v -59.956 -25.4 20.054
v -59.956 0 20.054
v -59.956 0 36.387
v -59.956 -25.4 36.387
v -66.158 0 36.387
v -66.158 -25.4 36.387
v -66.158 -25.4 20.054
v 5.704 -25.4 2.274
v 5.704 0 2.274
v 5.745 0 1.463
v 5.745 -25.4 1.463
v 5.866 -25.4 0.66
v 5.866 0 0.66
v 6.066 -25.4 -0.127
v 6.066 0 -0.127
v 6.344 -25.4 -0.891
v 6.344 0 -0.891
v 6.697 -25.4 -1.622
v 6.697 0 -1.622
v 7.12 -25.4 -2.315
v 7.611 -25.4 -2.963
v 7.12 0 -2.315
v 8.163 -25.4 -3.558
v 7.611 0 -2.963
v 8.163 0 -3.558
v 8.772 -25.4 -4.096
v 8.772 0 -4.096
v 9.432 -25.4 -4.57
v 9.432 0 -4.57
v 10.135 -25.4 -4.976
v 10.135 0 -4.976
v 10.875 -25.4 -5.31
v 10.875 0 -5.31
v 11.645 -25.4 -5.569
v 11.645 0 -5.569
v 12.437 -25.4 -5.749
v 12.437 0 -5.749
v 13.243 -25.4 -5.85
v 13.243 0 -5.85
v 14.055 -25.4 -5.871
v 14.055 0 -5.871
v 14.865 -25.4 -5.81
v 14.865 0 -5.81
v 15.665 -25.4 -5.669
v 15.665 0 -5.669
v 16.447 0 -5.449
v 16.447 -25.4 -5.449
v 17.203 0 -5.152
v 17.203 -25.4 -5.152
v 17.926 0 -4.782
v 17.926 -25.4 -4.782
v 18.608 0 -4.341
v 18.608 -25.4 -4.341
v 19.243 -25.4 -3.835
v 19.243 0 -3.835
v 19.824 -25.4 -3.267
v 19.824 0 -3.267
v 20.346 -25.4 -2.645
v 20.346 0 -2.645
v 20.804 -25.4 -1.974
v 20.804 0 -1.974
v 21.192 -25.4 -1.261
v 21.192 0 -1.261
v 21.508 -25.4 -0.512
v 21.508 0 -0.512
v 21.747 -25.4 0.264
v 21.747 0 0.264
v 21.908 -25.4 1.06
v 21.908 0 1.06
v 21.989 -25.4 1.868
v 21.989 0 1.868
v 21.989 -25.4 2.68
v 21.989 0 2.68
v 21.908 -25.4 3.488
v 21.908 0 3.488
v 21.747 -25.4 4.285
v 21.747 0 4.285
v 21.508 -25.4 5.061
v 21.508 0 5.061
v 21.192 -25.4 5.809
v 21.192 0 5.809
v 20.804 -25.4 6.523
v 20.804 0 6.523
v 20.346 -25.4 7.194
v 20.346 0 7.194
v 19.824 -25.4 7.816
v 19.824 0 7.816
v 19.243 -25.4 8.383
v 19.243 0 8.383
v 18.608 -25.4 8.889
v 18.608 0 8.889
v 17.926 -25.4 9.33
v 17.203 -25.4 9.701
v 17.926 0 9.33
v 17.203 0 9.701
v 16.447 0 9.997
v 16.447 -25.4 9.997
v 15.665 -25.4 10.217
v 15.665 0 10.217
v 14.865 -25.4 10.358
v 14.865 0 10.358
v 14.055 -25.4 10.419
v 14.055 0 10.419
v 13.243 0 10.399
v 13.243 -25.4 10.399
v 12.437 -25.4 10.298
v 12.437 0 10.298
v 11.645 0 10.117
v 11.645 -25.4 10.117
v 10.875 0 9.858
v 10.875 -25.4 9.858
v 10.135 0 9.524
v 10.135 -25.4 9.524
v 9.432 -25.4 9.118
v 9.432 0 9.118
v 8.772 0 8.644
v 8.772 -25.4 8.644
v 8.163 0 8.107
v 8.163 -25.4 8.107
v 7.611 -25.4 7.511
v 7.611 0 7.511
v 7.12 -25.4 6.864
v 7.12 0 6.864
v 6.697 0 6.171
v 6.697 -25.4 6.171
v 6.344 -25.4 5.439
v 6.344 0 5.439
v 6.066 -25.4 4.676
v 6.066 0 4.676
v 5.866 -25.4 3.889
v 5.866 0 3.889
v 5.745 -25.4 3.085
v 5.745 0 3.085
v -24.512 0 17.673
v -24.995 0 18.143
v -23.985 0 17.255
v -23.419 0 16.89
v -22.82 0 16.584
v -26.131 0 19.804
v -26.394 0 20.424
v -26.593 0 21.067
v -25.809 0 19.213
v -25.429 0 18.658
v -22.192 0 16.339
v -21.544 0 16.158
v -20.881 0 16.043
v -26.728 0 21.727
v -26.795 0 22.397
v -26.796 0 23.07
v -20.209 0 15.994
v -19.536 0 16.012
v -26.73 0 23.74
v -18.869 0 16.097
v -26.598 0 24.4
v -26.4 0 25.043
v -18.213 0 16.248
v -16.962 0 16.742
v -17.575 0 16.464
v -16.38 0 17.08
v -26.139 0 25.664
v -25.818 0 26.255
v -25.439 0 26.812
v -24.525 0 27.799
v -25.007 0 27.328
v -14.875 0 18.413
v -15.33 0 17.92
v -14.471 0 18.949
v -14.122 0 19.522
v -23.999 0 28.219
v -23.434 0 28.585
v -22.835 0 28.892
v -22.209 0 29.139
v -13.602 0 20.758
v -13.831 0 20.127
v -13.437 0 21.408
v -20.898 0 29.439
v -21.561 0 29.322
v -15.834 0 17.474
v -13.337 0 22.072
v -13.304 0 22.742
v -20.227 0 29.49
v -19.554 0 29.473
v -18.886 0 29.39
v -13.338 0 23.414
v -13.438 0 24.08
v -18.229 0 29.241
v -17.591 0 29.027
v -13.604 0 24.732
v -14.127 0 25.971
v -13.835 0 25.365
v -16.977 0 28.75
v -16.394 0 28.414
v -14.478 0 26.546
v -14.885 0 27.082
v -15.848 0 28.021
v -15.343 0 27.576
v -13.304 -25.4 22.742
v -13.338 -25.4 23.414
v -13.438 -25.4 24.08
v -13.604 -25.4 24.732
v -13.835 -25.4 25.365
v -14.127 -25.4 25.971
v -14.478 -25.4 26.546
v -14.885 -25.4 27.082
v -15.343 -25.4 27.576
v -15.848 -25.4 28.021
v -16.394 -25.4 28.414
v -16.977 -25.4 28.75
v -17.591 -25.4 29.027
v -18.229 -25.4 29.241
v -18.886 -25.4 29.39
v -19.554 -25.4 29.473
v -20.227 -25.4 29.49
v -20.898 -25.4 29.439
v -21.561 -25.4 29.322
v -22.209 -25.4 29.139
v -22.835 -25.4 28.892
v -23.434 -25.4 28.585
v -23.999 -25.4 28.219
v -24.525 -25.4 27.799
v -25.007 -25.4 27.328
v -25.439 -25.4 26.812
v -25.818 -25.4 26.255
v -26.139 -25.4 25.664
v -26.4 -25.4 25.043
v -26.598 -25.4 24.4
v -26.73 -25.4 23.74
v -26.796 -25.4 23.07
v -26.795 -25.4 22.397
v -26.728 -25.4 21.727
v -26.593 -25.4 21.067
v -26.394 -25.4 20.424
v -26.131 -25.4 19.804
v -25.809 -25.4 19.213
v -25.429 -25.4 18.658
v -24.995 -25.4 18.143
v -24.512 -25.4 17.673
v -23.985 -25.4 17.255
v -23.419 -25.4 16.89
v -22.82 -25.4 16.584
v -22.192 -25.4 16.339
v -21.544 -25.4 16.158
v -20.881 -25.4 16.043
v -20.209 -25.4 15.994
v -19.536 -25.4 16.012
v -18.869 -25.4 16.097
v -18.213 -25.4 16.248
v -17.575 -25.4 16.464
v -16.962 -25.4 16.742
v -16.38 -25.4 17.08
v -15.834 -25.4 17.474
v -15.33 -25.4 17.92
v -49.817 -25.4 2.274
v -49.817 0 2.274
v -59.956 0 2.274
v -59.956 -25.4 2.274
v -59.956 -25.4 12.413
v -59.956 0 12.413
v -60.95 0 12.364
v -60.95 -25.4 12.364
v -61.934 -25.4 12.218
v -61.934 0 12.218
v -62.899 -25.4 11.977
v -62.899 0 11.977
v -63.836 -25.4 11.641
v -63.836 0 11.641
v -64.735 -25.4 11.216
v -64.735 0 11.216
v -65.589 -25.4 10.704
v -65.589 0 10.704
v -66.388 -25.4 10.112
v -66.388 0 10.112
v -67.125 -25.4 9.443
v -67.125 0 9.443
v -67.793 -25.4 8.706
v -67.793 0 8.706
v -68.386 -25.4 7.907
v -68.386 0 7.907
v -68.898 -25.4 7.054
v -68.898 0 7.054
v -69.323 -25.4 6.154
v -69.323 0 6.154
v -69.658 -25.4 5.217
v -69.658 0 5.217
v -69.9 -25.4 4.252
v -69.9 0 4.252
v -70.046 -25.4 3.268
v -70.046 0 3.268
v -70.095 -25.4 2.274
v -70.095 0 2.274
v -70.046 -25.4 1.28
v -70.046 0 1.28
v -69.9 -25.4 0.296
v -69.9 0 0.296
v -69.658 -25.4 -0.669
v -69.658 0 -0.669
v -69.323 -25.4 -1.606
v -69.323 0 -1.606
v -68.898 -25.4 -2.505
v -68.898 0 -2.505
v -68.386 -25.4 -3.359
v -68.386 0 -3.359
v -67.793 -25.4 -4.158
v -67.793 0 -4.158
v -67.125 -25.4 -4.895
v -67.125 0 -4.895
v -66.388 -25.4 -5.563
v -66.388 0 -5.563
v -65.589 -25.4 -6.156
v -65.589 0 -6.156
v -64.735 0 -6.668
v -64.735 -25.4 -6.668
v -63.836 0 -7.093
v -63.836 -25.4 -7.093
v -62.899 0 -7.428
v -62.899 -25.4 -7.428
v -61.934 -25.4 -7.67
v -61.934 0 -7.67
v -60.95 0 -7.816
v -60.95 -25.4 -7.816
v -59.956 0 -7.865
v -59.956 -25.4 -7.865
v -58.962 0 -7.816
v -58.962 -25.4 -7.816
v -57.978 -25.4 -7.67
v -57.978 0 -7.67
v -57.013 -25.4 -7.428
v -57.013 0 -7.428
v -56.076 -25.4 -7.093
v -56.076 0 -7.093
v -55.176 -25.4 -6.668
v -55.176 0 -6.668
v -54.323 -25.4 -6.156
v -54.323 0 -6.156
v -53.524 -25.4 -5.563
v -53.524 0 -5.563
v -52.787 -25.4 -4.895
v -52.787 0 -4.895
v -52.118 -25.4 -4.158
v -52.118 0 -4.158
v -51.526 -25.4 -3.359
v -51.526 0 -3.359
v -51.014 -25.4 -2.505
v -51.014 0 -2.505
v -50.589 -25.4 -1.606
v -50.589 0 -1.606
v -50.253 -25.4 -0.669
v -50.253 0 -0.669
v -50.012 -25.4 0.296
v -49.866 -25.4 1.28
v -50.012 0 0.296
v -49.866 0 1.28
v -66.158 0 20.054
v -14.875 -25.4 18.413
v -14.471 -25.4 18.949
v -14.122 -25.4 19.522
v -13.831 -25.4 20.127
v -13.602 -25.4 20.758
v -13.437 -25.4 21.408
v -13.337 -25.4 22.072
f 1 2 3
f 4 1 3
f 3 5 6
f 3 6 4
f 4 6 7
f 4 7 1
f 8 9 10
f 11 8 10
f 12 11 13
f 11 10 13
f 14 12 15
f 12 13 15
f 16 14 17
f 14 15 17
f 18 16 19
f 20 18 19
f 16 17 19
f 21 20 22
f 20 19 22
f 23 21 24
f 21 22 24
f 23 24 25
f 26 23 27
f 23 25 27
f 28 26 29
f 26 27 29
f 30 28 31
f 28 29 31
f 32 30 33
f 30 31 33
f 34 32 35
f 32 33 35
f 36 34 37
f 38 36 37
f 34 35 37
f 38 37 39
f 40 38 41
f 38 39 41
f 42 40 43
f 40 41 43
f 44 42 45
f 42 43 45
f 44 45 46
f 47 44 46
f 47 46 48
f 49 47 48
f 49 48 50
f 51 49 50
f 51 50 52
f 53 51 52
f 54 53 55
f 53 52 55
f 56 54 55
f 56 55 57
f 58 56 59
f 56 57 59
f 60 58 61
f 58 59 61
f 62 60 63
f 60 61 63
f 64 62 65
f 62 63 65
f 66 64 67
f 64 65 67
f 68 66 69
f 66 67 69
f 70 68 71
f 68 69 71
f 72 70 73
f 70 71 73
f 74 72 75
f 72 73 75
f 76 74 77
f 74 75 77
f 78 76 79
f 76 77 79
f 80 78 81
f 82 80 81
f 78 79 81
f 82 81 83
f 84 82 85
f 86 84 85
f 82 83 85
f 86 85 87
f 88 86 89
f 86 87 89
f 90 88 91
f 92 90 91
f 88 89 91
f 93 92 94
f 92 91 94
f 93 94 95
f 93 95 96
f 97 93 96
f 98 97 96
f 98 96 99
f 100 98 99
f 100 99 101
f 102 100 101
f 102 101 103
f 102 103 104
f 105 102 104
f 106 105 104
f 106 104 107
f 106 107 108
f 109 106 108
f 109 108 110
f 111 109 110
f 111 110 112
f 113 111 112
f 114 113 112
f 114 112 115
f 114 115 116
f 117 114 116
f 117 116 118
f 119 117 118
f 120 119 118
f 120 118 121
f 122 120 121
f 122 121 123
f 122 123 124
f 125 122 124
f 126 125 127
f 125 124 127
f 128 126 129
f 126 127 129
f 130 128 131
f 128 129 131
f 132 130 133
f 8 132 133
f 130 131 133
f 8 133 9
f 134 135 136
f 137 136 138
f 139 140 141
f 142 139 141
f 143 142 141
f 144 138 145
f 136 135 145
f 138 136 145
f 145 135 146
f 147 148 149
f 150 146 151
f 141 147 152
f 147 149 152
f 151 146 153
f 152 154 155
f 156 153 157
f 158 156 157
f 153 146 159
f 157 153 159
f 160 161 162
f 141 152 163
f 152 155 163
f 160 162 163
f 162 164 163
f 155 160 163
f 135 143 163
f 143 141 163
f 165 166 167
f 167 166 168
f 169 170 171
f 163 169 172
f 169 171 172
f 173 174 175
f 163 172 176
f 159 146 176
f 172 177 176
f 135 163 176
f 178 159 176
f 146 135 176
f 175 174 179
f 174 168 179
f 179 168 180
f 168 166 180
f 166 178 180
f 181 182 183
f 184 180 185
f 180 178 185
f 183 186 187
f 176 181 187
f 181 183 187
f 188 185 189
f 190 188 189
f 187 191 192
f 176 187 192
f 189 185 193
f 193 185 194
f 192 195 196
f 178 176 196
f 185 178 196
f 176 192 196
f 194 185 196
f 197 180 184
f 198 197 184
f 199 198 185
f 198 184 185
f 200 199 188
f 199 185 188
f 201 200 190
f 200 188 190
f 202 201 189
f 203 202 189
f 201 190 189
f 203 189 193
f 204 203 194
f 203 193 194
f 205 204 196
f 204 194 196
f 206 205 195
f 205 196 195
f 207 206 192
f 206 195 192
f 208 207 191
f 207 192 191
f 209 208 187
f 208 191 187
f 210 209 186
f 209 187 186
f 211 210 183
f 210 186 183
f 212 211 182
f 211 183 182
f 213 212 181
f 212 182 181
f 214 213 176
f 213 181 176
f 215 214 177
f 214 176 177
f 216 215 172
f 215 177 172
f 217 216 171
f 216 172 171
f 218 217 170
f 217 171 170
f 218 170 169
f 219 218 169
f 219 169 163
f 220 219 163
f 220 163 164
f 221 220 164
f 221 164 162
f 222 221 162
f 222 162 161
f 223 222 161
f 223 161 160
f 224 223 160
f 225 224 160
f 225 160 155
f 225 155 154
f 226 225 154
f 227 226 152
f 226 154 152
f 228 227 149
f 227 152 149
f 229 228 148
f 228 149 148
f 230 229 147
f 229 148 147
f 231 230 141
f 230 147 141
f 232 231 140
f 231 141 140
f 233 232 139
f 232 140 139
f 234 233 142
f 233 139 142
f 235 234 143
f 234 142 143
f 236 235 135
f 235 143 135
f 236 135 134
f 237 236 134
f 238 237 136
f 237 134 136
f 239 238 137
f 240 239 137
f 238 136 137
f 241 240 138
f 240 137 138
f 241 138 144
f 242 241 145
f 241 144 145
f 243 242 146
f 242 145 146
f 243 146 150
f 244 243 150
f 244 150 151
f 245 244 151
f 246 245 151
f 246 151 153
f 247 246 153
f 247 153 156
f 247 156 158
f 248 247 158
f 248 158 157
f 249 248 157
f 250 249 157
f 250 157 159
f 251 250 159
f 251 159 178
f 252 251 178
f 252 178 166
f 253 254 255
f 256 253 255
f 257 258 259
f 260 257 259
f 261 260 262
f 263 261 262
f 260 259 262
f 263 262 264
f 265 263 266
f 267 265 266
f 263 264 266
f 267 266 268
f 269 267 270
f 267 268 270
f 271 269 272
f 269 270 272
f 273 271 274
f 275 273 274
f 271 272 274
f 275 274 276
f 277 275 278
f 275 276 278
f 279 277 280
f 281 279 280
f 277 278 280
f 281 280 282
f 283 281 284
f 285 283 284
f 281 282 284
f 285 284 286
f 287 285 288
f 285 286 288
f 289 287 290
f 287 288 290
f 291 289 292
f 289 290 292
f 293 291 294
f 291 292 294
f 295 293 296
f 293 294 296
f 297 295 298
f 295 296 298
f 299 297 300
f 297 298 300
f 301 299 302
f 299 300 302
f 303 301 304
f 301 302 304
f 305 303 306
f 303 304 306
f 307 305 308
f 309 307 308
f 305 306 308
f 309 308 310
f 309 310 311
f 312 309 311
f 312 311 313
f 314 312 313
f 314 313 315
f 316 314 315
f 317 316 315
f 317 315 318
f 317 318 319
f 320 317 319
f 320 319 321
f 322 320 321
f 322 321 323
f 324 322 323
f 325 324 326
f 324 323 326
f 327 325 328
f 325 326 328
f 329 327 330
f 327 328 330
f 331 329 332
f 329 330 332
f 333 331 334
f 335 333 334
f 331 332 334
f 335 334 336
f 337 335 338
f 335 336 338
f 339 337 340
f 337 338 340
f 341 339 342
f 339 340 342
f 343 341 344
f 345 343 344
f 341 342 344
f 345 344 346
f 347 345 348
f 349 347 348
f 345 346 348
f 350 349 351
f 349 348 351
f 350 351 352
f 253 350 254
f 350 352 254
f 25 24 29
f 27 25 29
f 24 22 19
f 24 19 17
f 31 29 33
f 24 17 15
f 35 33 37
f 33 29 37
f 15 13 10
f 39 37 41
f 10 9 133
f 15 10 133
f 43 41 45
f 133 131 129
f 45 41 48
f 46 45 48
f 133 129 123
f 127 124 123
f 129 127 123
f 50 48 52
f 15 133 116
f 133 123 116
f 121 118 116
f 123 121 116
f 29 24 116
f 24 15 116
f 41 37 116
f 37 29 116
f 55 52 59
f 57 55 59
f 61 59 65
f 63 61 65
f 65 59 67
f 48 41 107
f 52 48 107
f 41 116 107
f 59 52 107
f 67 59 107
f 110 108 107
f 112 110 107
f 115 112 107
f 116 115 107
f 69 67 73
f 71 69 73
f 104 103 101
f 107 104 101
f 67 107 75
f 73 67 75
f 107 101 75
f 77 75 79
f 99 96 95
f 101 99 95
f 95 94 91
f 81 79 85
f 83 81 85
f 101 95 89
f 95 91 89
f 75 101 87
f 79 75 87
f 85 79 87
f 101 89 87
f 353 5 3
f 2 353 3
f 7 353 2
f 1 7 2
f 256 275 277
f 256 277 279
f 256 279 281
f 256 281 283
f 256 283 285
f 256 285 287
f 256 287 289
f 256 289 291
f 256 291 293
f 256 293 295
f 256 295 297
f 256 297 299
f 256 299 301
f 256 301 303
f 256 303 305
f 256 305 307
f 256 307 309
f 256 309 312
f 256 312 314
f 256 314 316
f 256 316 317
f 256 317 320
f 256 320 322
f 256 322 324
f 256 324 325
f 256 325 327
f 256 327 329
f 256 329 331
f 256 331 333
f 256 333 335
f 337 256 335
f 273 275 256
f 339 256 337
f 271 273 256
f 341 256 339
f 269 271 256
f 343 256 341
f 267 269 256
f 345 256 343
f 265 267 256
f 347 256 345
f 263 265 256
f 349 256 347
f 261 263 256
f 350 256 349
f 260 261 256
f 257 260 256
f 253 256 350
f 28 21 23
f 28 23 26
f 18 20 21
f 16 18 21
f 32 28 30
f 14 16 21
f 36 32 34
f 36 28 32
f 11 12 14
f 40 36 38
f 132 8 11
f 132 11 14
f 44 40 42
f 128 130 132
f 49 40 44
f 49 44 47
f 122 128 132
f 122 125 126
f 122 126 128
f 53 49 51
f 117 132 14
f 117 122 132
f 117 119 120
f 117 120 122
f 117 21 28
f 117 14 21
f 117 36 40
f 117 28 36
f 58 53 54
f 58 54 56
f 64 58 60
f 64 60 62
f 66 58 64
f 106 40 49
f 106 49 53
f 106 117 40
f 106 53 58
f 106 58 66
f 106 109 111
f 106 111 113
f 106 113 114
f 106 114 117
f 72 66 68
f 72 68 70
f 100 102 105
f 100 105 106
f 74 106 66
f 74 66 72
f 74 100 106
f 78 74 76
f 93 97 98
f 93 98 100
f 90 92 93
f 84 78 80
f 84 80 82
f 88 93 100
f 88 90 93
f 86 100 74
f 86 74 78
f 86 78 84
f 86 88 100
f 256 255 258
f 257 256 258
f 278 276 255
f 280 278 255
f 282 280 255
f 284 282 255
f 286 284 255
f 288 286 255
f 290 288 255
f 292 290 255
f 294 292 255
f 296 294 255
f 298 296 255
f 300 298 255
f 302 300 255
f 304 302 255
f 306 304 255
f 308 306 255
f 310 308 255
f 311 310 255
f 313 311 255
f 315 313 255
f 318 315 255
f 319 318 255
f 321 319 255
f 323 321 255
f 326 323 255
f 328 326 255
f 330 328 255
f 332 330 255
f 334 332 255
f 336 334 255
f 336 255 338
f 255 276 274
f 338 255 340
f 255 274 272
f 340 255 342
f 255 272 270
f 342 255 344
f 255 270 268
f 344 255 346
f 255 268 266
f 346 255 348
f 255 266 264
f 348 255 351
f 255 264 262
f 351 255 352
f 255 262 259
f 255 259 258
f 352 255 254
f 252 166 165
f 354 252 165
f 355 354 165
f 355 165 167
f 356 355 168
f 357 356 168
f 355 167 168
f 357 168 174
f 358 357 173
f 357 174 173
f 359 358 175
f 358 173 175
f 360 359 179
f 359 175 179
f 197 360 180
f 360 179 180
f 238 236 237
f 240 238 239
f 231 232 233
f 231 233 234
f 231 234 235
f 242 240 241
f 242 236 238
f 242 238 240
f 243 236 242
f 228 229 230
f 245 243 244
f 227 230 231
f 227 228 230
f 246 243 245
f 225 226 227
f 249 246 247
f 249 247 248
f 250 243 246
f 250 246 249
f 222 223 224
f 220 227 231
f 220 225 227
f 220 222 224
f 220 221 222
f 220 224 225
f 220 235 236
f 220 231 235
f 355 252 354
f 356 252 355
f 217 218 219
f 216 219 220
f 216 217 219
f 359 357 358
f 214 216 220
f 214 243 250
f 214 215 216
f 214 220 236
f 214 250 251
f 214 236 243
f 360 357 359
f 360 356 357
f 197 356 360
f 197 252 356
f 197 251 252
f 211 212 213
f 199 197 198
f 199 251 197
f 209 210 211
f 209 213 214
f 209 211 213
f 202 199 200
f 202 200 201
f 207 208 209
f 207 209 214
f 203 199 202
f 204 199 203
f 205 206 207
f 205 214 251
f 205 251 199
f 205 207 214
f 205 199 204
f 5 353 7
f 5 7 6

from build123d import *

# Parameters (mm, degrees)
F0_W     = 6.202321
F0_H     = 16.332792
F1_DEPTH = 25.4


with BuildPart() as f1:
    # F0 (on Front) → F1 (new body)
    with BuildSketch(Plane.XZ):
        with BuildLine():
            Line((-59.955817, 2.274186), (-59.955817, 12.413087))
            ThreePointArc((-59.955817, 12.413087), (-67.125102, -4.895099), (-49.816916, 2.274186))
            Line((-49.816916, 2.274186), (-59.955817, 2.274186))
        make_face()
        with Locations((-63.056977, 28.220582)):
            Rectangle(F0_W, F0_H)
        with BuildLine():
            ThreePointArc((21.999261, 2.274186), (13.851861, 10.421587), (5.70446, 2.274186))
            ThreePointArc((5.70446, 2.274186), (13.851861, -5.873214), (21.999261, 2.274186))
        make_face()
        with BuildLine():
            ThreePointArc((-13.304059, 22.74186), (-26.27723, 25.356804), (-15.330076, 17.920346))
            ThreePointArc((-15.330076, 17.920346), (-13.831142, 20.126915), (-13.304059, 22.74186))
        make_face()
    extrude(amount=F1_DEPTH)


solid = f1.part
